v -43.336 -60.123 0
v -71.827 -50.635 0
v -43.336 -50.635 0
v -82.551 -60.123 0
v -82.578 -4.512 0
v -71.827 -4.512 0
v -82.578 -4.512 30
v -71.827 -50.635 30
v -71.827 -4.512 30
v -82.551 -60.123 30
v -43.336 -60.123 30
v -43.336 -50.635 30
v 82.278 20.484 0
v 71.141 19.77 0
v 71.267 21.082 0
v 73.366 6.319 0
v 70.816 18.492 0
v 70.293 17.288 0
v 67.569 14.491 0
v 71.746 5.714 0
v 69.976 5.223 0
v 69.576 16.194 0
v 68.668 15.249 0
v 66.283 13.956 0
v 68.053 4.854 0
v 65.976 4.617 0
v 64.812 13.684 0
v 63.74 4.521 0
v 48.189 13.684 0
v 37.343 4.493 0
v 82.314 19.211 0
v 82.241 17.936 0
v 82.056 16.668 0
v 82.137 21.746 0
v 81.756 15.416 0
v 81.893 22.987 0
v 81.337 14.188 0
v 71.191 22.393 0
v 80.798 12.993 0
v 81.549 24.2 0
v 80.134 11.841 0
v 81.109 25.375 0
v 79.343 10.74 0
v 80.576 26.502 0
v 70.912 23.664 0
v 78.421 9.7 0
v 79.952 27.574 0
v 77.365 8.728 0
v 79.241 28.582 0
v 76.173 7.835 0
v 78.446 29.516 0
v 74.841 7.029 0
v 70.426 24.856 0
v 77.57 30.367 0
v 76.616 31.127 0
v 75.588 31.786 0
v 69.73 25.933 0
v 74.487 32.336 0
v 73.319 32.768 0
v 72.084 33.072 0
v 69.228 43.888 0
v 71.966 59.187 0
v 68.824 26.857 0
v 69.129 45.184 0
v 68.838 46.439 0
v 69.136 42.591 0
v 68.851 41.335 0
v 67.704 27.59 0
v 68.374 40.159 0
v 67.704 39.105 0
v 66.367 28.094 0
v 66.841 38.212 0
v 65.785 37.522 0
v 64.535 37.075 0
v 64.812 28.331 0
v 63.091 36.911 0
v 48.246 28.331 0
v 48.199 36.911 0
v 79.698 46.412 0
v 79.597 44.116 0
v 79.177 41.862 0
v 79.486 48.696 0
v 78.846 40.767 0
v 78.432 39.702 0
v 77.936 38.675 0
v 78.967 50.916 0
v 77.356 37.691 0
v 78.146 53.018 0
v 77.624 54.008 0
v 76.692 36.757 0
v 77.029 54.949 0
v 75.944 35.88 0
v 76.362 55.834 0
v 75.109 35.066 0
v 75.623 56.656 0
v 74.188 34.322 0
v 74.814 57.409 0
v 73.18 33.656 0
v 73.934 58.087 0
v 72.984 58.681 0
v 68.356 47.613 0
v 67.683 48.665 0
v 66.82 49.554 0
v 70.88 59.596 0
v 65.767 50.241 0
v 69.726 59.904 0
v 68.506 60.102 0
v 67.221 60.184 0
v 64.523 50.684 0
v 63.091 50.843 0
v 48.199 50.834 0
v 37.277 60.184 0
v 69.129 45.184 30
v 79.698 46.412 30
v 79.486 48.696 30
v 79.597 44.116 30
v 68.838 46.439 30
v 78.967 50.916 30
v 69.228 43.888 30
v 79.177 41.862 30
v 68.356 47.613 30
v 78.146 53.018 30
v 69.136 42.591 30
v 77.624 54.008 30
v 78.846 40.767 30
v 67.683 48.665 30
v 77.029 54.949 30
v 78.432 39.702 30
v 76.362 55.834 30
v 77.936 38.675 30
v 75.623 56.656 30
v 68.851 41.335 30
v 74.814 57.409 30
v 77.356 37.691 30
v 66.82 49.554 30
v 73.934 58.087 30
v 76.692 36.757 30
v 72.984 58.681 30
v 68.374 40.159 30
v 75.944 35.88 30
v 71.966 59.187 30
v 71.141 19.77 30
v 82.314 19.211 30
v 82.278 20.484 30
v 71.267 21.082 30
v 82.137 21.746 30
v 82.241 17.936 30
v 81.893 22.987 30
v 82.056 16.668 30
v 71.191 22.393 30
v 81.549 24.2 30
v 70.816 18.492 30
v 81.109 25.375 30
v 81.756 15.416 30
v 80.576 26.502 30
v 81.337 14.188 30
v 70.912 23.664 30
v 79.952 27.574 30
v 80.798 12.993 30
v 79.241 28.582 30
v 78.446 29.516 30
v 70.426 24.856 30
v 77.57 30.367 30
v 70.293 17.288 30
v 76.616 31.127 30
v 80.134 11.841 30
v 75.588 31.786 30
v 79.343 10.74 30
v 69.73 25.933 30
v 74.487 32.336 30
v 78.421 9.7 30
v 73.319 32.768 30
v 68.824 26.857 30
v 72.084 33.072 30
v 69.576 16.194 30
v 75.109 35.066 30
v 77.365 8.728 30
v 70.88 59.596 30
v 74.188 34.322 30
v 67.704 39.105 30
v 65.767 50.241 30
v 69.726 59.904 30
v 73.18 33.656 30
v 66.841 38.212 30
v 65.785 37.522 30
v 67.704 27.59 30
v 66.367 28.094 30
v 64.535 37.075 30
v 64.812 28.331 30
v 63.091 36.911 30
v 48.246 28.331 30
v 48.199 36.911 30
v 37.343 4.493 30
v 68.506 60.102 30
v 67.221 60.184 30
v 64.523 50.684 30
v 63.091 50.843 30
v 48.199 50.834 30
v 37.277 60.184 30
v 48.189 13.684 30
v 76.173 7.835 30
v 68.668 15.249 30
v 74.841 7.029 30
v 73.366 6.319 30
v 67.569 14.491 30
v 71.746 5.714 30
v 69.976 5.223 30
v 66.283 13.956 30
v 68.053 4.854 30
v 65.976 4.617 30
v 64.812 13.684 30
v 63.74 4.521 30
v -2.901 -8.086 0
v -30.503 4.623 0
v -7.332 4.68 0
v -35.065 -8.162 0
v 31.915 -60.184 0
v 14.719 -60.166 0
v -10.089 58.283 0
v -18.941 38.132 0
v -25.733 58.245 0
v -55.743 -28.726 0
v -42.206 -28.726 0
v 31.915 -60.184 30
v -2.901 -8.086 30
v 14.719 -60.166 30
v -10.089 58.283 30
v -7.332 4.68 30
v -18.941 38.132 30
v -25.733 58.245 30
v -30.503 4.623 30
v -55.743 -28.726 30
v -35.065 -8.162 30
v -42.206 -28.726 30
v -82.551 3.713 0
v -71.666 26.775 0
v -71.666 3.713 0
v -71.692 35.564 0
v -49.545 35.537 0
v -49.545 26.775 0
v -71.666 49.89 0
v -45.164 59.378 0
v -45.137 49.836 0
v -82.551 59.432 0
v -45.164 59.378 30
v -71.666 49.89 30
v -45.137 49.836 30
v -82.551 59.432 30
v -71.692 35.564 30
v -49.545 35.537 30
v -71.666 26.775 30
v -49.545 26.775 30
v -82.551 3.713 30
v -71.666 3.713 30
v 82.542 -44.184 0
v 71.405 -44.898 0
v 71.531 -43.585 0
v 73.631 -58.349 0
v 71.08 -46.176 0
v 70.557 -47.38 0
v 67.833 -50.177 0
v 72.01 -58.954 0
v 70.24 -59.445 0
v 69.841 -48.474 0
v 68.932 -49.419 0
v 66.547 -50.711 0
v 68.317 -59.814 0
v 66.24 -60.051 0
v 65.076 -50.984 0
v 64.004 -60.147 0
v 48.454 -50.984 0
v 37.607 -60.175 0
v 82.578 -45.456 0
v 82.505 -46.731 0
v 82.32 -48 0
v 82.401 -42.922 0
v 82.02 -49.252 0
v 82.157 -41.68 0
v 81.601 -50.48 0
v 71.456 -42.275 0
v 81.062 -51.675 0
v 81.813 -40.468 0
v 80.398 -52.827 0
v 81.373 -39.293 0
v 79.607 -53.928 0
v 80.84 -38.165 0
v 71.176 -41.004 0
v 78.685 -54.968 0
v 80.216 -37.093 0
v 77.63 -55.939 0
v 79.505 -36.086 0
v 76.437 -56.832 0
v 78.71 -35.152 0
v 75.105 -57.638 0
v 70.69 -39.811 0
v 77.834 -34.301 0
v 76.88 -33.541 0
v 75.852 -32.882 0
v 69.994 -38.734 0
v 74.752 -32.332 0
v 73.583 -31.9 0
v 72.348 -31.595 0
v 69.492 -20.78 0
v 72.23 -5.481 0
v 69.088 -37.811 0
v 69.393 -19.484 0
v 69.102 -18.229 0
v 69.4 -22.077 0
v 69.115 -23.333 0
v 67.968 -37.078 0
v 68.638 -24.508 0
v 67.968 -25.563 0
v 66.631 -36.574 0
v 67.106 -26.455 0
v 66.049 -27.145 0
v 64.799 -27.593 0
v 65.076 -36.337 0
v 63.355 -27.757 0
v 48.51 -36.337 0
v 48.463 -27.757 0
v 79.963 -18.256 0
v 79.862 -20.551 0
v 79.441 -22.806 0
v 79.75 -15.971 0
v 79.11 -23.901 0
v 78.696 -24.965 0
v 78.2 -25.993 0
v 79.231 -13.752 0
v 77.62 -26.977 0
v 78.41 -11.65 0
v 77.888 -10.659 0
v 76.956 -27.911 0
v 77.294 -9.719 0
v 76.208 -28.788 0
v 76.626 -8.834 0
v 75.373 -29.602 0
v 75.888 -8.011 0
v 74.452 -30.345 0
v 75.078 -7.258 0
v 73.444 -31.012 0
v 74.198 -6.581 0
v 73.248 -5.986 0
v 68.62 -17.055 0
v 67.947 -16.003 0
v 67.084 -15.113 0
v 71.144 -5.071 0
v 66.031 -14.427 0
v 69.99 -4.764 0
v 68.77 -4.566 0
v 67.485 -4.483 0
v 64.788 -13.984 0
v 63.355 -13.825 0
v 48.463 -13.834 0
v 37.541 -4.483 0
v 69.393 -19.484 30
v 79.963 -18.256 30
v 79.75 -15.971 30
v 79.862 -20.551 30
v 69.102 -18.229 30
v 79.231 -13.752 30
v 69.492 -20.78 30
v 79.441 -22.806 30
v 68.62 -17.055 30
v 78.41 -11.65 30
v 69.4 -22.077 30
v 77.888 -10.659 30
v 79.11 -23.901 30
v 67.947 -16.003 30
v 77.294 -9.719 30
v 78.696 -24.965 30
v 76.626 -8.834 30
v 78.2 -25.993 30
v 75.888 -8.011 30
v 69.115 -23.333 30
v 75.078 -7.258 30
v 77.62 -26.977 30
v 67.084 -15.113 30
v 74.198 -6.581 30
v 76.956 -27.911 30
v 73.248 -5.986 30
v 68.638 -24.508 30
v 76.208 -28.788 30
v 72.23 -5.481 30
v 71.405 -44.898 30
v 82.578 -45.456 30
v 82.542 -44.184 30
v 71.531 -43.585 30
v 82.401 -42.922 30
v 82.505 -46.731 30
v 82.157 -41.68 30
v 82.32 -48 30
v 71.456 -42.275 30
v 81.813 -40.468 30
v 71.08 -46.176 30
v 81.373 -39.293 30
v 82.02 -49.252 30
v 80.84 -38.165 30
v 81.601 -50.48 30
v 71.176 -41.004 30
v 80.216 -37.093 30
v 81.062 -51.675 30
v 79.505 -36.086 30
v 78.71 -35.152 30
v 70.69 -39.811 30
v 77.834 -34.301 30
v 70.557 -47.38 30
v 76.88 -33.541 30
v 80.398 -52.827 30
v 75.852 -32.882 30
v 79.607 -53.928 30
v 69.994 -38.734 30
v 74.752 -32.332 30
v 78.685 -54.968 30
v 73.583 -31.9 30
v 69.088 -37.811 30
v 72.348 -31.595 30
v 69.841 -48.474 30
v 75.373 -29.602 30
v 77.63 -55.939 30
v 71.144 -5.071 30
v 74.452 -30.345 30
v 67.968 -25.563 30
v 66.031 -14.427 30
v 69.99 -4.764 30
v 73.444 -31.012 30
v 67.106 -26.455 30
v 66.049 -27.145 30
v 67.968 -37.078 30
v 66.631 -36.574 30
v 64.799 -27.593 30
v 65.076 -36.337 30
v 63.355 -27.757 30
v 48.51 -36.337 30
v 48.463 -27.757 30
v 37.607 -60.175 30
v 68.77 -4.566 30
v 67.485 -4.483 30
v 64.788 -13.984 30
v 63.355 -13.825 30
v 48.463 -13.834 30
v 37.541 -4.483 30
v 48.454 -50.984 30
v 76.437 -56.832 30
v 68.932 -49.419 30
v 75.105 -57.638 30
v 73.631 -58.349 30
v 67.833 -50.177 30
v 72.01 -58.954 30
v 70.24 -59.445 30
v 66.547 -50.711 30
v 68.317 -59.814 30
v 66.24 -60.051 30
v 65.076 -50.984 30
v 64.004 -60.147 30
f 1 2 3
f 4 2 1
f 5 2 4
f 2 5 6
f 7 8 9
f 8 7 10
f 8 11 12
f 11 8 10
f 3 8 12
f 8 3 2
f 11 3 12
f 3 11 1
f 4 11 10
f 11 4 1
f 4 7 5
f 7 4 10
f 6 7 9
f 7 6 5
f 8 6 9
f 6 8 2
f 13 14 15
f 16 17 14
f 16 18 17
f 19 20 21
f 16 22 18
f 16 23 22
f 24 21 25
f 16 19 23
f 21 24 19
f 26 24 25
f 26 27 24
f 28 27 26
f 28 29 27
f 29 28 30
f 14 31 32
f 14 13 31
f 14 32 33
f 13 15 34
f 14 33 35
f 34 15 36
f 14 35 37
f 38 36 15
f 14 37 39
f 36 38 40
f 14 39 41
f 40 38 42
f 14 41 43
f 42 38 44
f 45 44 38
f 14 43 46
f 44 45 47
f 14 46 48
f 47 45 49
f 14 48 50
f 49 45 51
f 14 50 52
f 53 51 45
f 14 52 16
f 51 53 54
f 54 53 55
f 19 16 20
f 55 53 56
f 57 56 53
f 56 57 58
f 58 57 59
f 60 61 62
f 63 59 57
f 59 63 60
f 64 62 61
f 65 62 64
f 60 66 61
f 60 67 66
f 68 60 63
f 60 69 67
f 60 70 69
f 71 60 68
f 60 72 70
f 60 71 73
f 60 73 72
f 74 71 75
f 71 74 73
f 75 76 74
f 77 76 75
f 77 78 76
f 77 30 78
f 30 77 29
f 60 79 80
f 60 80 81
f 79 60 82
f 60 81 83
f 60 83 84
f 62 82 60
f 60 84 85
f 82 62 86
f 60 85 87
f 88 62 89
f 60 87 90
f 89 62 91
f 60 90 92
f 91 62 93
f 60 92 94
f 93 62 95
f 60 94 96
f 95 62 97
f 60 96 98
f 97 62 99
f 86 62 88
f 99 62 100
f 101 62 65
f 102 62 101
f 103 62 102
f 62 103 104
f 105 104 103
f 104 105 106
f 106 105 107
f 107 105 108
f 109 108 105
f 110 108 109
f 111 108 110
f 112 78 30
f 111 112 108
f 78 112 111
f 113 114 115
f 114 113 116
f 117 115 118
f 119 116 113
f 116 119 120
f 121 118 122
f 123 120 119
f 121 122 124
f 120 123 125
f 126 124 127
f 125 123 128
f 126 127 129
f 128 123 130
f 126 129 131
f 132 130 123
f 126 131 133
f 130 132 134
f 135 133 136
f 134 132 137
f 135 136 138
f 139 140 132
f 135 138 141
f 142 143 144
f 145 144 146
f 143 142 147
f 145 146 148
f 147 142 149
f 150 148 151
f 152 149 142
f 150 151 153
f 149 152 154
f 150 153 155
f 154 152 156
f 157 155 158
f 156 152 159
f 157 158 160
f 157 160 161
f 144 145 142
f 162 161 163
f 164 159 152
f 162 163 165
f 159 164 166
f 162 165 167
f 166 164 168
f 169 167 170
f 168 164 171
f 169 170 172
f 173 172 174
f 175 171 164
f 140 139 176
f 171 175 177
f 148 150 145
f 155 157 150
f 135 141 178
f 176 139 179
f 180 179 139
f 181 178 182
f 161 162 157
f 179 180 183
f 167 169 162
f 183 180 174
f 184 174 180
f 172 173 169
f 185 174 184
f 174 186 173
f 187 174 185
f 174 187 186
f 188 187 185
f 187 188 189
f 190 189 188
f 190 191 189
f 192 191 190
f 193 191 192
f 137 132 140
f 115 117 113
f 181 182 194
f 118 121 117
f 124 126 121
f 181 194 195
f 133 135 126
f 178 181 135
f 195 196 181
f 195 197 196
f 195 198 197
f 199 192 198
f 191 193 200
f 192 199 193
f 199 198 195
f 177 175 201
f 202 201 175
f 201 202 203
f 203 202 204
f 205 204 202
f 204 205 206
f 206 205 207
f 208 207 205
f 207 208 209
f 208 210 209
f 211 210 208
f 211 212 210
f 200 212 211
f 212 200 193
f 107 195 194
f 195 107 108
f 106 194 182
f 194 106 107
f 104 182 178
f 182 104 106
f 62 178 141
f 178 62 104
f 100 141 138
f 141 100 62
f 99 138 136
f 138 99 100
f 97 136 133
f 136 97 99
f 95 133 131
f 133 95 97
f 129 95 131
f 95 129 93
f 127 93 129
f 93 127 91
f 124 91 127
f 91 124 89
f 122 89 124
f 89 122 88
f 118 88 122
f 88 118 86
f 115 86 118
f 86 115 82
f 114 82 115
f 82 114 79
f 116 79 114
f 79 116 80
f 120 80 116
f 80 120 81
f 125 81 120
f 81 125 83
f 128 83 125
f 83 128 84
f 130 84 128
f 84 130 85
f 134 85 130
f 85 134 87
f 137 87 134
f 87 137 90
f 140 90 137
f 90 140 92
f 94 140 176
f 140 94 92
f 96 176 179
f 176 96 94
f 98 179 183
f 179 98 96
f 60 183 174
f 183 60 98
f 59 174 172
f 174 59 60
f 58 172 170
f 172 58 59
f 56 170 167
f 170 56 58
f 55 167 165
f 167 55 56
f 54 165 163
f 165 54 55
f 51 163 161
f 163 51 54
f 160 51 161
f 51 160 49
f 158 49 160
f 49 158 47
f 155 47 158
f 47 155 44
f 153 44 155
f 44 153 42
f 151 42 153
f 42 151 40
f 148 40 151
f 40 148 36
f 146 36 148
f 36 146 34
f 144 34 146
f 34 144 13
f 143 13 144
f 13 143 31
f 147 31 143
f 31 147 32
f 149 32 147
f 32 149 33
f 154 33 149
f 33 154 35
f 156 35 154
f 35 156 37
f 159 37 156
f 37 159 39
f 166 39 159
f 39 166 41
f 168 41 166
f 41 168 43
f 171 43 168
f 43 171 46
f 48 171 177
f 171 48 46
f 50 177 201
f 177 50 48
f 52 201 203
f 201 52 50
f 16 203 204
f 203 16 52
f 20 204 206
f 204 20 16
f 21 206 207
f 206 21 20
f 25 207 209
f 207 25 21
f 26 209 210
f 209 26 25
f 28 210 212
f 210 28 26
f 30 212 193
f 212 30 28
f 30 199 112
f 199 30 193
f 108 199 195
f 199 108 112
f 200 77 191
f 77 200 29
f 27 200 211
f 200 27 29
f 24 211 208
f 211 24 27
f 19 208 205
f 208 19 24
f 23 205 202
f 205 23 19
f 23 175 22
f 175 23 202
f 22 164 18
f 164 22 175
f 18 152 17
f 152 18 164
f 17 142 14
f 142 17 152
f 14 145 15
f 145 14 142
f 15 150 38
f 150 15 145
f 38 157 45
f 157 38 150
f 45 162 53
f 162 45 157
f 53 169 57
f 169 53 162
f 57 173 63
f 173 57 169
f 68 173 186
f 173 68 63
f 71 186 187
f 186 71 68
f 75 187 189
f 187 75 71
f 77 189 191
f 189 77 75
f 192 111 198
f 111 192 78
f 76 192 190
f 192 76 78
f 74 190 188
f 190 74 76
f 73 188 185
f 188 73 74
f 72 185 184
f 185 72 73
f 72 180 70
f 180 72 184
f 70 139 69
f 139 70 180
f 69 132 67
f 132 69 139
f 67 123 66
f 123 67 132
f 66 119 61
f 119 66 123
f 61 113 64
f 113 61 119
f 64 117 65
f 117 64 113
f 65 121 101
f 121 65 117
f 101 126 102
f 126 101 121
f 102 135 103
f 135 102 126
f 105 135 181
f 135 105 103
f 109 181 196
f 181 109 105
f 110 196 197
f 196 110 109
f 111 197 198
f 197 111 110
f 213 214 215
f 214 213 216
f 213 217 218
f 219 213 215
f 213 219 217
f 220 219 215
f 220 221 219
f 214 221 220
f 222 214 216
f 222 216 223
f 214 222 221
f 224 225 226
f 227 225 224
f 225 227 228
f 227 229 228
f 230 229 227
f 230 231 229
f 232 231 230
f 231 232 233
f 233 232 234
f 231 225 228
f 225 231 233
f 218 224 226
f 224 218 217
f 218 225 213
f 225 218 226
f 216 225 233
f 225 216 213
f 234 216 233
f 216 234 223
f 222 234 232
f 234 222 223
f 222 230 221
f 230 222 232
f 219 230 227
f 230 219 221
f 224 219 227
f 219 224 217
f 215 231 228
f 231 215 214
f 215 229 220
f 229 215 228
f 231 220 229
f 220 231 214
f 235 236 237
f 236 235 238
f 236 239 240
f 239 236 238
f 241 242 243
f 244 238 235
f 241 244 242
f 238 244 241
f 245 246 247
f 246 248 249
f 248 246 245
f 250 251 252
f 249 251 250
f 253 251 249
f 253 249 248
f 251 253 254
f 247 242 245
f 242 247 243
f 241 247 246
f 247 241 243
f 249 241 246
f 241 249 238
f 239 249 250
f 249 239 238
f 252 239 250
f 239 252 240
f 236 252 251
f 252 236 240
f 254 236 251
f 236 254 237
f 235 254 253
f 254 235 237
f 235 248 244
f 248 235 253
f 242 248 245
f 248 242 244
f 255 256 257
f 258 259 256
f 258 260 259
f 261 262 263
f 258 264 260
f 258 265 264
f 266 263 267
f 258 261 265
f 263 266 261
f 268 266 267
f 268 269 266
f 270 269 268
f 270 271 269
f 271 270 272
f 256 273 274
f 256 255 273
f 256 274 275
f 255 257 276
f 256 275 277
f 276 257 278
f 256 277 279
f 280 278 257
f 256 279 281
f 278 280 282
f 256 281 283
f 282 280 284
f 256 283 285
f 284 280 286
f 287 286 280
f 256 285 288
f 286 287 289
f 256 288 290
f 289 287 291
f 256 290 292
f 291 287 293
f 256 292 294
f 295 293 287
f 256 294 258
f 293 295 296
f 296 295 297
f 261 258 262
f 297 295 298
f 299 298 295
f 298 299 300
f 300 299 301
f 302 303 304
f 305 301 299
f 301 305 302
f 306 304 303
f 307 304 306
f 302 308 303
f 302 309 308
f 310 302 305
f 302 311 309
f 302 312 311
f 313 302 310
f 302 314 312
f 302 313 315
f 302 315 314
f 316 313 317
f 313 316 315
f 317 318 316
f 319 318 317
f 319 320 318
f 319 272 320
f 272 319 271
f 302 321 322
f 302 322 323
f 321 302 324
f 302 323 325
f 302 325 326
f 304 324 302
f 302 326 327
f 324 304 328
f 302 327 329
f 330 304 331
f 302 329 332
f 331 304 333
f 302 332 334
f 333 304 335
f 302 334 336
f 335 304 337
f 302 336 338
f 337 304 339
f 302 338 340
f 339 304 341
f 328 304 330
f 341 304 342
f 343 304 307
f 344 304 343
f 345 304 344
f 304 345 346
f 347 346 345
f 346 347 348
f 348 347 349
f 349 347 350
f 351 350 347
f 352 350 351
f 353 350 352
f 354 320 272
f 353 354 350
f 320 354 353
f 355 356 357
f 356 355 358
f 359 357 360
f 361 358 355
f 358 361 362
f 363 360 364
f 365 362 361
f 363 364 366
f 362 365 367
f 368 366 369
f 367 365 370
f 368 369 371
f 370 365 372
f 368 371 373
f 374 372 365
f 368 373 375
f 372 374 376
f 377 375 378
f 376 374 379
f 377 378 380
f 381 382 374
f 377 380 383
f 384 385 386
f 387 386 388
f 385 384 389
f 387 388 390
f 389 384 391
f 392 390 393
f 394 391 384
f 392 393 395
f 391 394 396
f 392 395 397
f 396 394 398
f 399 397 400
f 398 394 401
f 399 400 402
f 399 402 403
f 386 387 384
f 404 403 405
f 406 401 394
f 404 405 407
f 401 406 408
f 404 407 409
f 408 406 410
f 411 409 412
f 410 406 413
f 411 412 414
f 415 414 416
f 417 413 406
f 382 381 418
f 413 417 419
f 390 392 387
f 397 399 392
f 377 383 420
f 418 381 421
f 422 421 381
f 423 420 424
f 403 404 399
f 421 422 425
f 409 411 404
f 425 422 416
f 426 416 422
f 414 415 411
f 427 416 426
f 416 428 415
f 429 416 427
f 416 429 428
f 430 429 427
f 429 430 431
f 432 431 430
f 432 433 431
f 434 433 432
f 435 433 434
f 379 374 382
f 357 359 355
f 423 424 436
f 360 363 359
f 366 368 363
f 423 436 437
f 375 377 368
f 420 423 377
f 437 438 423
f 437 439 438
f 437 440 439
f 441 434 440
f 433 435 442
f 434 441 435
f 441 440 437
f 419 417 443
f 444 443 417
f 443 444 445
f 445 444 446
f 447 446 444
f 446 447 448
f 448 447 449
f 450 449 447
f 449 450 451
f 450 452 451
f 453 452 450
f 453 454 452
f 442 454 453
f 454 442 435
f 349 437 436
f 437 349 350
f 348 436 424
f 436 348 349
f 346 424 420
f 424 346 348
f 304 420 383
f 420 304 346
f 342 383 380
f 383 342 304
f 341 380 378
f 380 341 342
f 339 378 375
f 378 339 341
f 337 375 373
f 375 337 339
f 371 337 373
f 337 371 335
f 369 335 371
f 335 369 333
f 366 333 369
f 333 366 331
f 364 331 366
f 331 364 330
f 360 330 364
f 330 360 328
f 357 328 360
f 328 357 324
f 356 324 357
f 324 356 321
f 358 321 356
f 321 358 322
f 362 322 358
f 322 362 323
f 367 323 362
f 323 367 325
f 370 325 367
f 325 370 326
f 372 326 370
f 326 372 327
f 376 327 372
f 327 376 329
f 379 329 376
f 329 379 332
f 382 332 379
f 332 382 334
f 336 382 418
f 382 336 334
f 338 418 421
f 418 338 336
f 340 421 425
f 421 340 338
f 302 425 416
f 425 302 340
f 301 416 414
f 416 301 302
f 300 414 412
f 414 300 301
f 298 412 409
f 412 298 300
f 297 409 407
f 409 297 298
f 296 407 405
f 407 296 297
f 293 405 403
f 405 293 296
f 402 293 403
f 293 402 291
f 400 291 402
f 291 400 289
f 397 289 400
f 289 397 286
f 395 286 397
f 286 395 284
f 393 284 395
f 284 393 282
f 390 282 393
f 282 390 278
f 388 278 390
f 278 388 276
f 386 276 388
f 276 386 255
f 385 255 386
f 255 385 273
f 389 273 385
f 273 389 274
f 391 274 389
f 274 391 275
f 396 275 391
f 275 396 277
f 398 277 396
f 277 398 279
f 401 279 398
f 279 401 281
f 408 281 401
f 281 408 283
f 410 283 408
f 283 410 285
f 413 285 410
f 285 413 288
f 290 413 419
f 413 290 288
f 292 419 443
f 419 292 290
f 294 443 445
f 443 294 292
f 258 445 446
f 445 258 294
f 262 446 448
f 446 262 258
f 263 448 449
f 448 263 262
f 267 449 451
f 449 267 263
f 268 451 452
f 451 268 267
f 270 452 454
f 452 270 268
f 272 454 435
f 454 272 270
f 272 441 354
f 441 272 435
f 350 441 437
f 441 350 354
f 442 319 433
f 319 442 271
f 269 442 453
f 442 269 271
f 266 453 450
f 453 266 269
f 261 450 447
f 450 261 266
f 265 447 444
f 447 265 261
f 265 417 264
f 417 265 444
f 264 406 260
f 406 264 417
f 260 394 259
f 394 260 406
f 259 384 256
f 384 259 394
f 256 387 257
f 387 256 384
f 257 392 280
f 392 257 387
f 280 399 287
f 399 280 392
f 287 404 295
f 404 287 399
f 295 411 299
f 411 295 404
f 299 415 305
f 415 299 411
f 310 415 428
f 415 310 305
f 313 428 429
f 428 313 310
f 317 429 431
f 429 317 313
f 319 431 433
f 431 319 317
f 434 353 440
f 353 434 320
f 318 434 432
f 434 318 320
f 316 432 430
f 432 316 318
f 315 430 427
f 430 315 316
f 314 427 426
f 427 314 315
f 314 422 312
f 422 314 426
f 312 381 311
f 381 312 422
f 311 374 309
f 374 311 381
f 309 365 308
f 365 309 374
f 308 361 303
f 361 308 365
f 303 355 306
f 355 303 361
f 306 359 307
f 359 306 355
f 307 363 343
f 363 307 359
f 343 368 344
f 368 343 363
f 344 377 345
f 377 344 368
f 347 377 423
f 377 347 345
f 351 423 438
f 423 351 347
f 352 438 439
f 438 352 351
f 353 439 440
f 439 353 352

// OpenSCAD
// Module names are of the form poly_<inkscape-path-id>().
// As a result you can associate a polygon in this OpenSCAD program with the
//  corresponding SVG element in the Inkscape document by looking for
//  the XML element with the attribute id="inkscape-path-id".

// Paths have their own variables so they can be imported and used
//  in polygon(points) structures in other programs.
// The NN_points is the list of all polygon XY vertices.
// There may be an NN_paths variable as well. If it exists then it
//  defines the nested paths. Both must be used in the
//  polygon(points, paths) variant of the command.

profile_scale = 25.4/90; //made in inkscape in mm

// helper functions to determine the X,Y dimensions of the profiles
function min_x(shape_points) = min([ for (x = shape_points) min(x[0])]);
function max_x(shape_points) = max([ for (x = shape_points) max(x[0])]);
function min_y(shape_points) = min([ for (x = shape_points) min(x[1])]);
function max_y(shape_points) = max([ for (x = shape_points) max(x[1])]);

// height = 30;
// width = 1.0;


path3792_0_points = [[-292.599837,15.985990],[-254.504597,15.985990],[-254.504597,179.414570],[-153.552217,179.414570],[-153.552217,213.033620],[-292.504597,213.033620],[-292.599837,15.985990]];

module poly_path3792(h, w, res=4)  {
  scale([profile_scale, -profile_scale, 1])
  union()  {
    linear_extrude(height=h)
      polygon(path3792_0_points);
  }
}

path37949_0_points = [[132.083323,-213.252090],[132.316663,-15.918750],[225.849993,-16.018650],[233.772559,-16.359792],[241.133859,-17.199179],[247.944868,-18.505183],[254.216558,-20.246174],[259.959906,-22.390524],[265.185885,-24.906604],[269.905469,-27.762784],[274.129633,-30.927436],[277.869351,-34.368930],[281.135598,-38.055639],[283.939347,-41.955932],[286.291573,-46.038181],[288.203250,-50.270757],[289.685353,-54.622031],[290.748855,-59.060374],[291.404732,-63.554157],[291.663957,-68.071752],[291.537505,-72.581528],[291.036349,-77.051858],[290.171465,-81.451112],[288.953827,-85.747662],[287.394409,-89.909878],[285.504184,-93.906131],[283.294129,-97.704793],[280.775216,-101.274235],[277.958420,-104.582827],[274.854715,-107.598940],[271.475076,-110.290947],[267.830477,-112.627217],[263.931893,-114.576122],[259.790296,-116.106032],[255.416663,-117.185320],[259.299755,-119.252329],[262.871490,-121.614813],[266.134477,-124.249257],[269.091326,-127.132146],[271.744646,-130.239966],[274.097044,-133.549202],[276.151131,-137.036339],[277.909516,-140.677863],[279.374806,-144.450258],[280.549613,-148.330010],[282.038207,-156.317526],[282.396170,-164.452293],[281.644374,-172.546191],[279.803692,-180.411104],[276.894994,-187.858914],[275.046663,-191.367618],[272.939154,-194.701501],[270.575078,-197.837050],[267.957042,-200.750749],[265.087657,-203.419083],[261.969531,-205.818539],[258.605274,-207.925600],[254.997493,-209.716753],[251.148799,-211.168482],[247.061800,-212.257272],[242.739105,-212.959610],[238.183323,-213.251980],[132.083323,-213.252090],[223.549993,-180.152090],[228.626298,-179.588456],[233.031217,-178.018516],[236.763581,-175.585855],[239.822221,-172.434060],[242.205969,-168.706718],[243.913655,-164.547413],[244.944111,-160.099733],[245.296168,-155.507264],[244.968657,-150.913591],[243.960409,-146.462300],[242.270256,-142.296979],[239.897028,-138.561213],[236.839556,-135.398587],[233.096673,-132.952689],[228.667208,-131.367105],[223.549993,-130.785420],[170.783323,-130.785420],[170.783323,-180.118750],[223.549993,-180.152090],[170.949993,-100.385420],[229.649993,-100.385420],[235.159584,-99.544560],[239.894784,-97.759189],[243.864117,-95.163049],[247.076107,-91.889880],[249.539278,-88.073424],[251.262155,-83.847423],[252.253260,-79.345616],[252.521119,-74.701745],[252.074256,-70.049552],[250.921193,-65.522777],[249.070456,-61.255162],[246.530569,-57.380447],[243.310055,-54.032375],[239.417438,-51.344685],[234.861243,-49.451120],[229.649993,-48.485420],[170.749993,-48.485420],[170.949993,-100.385420]];
path37949_0_paths = [[0,1,2,3,4,5,6,7,8,9,10,11,12,13,14,15,16,17,18,19,20,21,22,23,24,25,26,27,28,29,30,31,32,33,34,35,36,37,38,39,40,41,42,43,44,45,46,47,48,49,50,51,52,53,54,55,56,57,58,59,60,61,62],
				[63,64,65,66,67,68,69,70,71,72,73,74,75,76,77,78,79,80,81,82],
				[83,84,85,86,87,88,89,90,91,92,93,94,95,96,97,98,99,100,101,102]];

module poly_path37949(h, w, res=4)  {
  scale([profile_scale, -profile_scale, 1])
  union()  {
    linear_extrude(height=h)
      polygon(path37949_0_points, path37949_0_paths);
  }
}

path3839_0_points = [[-35.747457,-206.514610],[-91.180787,-206.381280],[-197.514127,101.785390],[-149.547457,101.785390],[-124.247457,28.918720],[-10.280787,28.652050],[52.152543,213.185390],[113.085873,213.252090],[-35.747457,-206.514610],[-67.114127,-135.114610],[-25.980787,-16.581280],[-108.080787,-16.381280],[-67.114127,-135.114610]];
path3839_0_paths = [[0,1,2,3,4,5,6,7,8],
				[9,10,11,12]];

module poly_path3839(h, w, res=4)  {
  scale([profile_scale, -profile_scale, 1])
  union()  {
    linear_extrude(height=h)
      polygon(path3839_0_points, path3839_0_paths);
  }
}

path3790_0_points = [[-292.504597,-210.585430],[-160.028407,-210.394950],[-159.933107,-176.585430],[-253.933107,-176.775900],[-254.028407,-126.014010],[-175.552217,-125.918710],[-175.552217,-94.871100],[-253.933177,-94.871100],[-253.933177,-13.156800],[-292.504597,-13.156800],[-292.504597,-210.585430]];

module poly_path3790(h, w, res=4)  {
  scale([profile_scale, -profile_scale, 1])
  union()  {
    linear_extrude(height=h)
      polygon(path3790_0_points);
  }
}

path3794_0_points = [[133.019213,15.885390],[133.252543,213.218720],[226.785873,213.118820],[234.708439,212.777674],[242.069739,211.938284],[248.880748,210.632277],[255.152438,208.891282],[260.895786,206.746930],[266.121765,204.230848],[270.841349,201.374665],[275.065513,198.210011],[278.805231,194.768515],[282.071478,191.081804],[284.875227,187.181510],[287.227453,183.099259],[289.139130,178.866681],[290.621233,174.515406],[291.684735,170.077062],[292.340612,165.583278],[292.599837,161.065682],[292.473385,156.555905],[291.972229,152.085574],[291.107345,147.686320],[289.889707,143.389770],[288.330289,139.227553],[286.440064,135.231300],[284.230009,131.432638],[281.711096,127.863196],[278.894300,124.554604],[275.790595,121.538490],[272.410956,118.846484],[268.766357,116.510213],[264.867773,114.561308],[260.726176,113.031398],[256.352543,111.952110],[260.235635,109.885100],[263.807370,107.522616],[267.070357,104.888171],[270.027206,102.005281],[272.680526,98.897460],[275.032924,95.588223],[277.087011,92.101085],[278.845396,88.459561],[280.310687,84.687166],[281.485493,80.807413],[282.974087,72.819896],[283.332051,64.685129],[282.580256,56.591230],[280.739574,48.726317],[277.830877,41.278507],[275.982545,37.769803],[273.875037,34.435919],[271.510961,31.300370],[268.892927,28.386671],[266.023542,25.718337],[262.905417,23.318881],[259.541160,21.211820],[255.933380,19.420668],[252.084687,17.968938],[247.997688,16.880148],[243.674994,16.177810],[239.119213,15.885440],[133.019213,15.885390],[224.485873,48.985390],[229.562178,49.549024],[233.967097,51.118964],[237.699461,53.551624],[240.758102,56.703418],[243.141851,60.430760],[244.849538,64.590063],[245.879994,69.037743],[246.232052,73.630211],[245.904541,78.223883],[244.896294,82.675173],[243.206140,86.840493],[240.832912,90.576259],[237.775440,93.738884],[234.032556,96.184781],[229.603090,97.770365],[224.485873,98.352050],[171.719213,98.352050],[171.719213,49.018720],[224.485873,48.985390],[171.885873,128.752050],[230.585873,128.752050],[236.095466,129.592910],[240.830667,131.378281],[244.800001,133.974421],[248.011992,137.247590],[250.475164,141.064046],[252.198042,145.290047],[253.189148,149.791854],[253.457007,154.435725],[253.010143,159.087918],[251.857080,163.614693],[250.006343,167.882308],[247.466455,171.757023],[244.245939,175.105095],[240.353321,177.792785],[235.797125,179.686350],[230.585873,180.652050],[171.685873,180.652050],[171.885873,128.752050]];
path3794_0_paths = [[0,1,2,3,4,5,6,7,8,9,10,11,12,13,14,15,16,17,18,19,20,21,22,23,24,25,26,27,28,29,30,31,32,33,34,35,36,37,38,39,40,41,42,43,44,45,46,47,48,49,50,51,52,53,54,55,56,57,58,59,60,61,62],
				[63,64,65,66,67,68,69,70,71,72,73,74,75,76,77,78,79,80,81,82],
				[83,84,85,86,87,88,89,90,91,92,93,94,95,96,97,98,99,100,101,102]];

module poly_path3794(h, w, res=4)  {
  scale([profile_scale, -profile_scale, 1])
  union()  {
    linear_extrude(height=h)
      polygon(path3794_0_points, path3794_0_paths);
  }
}

// The shapes
module logo_fablab(h, w) {
	poly_path3792(h, w);
	poly_path37949(h, w);
	poly_path3839(h, w);
	poly_path3790(h, w);
	poly_path3794(h, w);
}

logo_fablab (30, 1.0);
